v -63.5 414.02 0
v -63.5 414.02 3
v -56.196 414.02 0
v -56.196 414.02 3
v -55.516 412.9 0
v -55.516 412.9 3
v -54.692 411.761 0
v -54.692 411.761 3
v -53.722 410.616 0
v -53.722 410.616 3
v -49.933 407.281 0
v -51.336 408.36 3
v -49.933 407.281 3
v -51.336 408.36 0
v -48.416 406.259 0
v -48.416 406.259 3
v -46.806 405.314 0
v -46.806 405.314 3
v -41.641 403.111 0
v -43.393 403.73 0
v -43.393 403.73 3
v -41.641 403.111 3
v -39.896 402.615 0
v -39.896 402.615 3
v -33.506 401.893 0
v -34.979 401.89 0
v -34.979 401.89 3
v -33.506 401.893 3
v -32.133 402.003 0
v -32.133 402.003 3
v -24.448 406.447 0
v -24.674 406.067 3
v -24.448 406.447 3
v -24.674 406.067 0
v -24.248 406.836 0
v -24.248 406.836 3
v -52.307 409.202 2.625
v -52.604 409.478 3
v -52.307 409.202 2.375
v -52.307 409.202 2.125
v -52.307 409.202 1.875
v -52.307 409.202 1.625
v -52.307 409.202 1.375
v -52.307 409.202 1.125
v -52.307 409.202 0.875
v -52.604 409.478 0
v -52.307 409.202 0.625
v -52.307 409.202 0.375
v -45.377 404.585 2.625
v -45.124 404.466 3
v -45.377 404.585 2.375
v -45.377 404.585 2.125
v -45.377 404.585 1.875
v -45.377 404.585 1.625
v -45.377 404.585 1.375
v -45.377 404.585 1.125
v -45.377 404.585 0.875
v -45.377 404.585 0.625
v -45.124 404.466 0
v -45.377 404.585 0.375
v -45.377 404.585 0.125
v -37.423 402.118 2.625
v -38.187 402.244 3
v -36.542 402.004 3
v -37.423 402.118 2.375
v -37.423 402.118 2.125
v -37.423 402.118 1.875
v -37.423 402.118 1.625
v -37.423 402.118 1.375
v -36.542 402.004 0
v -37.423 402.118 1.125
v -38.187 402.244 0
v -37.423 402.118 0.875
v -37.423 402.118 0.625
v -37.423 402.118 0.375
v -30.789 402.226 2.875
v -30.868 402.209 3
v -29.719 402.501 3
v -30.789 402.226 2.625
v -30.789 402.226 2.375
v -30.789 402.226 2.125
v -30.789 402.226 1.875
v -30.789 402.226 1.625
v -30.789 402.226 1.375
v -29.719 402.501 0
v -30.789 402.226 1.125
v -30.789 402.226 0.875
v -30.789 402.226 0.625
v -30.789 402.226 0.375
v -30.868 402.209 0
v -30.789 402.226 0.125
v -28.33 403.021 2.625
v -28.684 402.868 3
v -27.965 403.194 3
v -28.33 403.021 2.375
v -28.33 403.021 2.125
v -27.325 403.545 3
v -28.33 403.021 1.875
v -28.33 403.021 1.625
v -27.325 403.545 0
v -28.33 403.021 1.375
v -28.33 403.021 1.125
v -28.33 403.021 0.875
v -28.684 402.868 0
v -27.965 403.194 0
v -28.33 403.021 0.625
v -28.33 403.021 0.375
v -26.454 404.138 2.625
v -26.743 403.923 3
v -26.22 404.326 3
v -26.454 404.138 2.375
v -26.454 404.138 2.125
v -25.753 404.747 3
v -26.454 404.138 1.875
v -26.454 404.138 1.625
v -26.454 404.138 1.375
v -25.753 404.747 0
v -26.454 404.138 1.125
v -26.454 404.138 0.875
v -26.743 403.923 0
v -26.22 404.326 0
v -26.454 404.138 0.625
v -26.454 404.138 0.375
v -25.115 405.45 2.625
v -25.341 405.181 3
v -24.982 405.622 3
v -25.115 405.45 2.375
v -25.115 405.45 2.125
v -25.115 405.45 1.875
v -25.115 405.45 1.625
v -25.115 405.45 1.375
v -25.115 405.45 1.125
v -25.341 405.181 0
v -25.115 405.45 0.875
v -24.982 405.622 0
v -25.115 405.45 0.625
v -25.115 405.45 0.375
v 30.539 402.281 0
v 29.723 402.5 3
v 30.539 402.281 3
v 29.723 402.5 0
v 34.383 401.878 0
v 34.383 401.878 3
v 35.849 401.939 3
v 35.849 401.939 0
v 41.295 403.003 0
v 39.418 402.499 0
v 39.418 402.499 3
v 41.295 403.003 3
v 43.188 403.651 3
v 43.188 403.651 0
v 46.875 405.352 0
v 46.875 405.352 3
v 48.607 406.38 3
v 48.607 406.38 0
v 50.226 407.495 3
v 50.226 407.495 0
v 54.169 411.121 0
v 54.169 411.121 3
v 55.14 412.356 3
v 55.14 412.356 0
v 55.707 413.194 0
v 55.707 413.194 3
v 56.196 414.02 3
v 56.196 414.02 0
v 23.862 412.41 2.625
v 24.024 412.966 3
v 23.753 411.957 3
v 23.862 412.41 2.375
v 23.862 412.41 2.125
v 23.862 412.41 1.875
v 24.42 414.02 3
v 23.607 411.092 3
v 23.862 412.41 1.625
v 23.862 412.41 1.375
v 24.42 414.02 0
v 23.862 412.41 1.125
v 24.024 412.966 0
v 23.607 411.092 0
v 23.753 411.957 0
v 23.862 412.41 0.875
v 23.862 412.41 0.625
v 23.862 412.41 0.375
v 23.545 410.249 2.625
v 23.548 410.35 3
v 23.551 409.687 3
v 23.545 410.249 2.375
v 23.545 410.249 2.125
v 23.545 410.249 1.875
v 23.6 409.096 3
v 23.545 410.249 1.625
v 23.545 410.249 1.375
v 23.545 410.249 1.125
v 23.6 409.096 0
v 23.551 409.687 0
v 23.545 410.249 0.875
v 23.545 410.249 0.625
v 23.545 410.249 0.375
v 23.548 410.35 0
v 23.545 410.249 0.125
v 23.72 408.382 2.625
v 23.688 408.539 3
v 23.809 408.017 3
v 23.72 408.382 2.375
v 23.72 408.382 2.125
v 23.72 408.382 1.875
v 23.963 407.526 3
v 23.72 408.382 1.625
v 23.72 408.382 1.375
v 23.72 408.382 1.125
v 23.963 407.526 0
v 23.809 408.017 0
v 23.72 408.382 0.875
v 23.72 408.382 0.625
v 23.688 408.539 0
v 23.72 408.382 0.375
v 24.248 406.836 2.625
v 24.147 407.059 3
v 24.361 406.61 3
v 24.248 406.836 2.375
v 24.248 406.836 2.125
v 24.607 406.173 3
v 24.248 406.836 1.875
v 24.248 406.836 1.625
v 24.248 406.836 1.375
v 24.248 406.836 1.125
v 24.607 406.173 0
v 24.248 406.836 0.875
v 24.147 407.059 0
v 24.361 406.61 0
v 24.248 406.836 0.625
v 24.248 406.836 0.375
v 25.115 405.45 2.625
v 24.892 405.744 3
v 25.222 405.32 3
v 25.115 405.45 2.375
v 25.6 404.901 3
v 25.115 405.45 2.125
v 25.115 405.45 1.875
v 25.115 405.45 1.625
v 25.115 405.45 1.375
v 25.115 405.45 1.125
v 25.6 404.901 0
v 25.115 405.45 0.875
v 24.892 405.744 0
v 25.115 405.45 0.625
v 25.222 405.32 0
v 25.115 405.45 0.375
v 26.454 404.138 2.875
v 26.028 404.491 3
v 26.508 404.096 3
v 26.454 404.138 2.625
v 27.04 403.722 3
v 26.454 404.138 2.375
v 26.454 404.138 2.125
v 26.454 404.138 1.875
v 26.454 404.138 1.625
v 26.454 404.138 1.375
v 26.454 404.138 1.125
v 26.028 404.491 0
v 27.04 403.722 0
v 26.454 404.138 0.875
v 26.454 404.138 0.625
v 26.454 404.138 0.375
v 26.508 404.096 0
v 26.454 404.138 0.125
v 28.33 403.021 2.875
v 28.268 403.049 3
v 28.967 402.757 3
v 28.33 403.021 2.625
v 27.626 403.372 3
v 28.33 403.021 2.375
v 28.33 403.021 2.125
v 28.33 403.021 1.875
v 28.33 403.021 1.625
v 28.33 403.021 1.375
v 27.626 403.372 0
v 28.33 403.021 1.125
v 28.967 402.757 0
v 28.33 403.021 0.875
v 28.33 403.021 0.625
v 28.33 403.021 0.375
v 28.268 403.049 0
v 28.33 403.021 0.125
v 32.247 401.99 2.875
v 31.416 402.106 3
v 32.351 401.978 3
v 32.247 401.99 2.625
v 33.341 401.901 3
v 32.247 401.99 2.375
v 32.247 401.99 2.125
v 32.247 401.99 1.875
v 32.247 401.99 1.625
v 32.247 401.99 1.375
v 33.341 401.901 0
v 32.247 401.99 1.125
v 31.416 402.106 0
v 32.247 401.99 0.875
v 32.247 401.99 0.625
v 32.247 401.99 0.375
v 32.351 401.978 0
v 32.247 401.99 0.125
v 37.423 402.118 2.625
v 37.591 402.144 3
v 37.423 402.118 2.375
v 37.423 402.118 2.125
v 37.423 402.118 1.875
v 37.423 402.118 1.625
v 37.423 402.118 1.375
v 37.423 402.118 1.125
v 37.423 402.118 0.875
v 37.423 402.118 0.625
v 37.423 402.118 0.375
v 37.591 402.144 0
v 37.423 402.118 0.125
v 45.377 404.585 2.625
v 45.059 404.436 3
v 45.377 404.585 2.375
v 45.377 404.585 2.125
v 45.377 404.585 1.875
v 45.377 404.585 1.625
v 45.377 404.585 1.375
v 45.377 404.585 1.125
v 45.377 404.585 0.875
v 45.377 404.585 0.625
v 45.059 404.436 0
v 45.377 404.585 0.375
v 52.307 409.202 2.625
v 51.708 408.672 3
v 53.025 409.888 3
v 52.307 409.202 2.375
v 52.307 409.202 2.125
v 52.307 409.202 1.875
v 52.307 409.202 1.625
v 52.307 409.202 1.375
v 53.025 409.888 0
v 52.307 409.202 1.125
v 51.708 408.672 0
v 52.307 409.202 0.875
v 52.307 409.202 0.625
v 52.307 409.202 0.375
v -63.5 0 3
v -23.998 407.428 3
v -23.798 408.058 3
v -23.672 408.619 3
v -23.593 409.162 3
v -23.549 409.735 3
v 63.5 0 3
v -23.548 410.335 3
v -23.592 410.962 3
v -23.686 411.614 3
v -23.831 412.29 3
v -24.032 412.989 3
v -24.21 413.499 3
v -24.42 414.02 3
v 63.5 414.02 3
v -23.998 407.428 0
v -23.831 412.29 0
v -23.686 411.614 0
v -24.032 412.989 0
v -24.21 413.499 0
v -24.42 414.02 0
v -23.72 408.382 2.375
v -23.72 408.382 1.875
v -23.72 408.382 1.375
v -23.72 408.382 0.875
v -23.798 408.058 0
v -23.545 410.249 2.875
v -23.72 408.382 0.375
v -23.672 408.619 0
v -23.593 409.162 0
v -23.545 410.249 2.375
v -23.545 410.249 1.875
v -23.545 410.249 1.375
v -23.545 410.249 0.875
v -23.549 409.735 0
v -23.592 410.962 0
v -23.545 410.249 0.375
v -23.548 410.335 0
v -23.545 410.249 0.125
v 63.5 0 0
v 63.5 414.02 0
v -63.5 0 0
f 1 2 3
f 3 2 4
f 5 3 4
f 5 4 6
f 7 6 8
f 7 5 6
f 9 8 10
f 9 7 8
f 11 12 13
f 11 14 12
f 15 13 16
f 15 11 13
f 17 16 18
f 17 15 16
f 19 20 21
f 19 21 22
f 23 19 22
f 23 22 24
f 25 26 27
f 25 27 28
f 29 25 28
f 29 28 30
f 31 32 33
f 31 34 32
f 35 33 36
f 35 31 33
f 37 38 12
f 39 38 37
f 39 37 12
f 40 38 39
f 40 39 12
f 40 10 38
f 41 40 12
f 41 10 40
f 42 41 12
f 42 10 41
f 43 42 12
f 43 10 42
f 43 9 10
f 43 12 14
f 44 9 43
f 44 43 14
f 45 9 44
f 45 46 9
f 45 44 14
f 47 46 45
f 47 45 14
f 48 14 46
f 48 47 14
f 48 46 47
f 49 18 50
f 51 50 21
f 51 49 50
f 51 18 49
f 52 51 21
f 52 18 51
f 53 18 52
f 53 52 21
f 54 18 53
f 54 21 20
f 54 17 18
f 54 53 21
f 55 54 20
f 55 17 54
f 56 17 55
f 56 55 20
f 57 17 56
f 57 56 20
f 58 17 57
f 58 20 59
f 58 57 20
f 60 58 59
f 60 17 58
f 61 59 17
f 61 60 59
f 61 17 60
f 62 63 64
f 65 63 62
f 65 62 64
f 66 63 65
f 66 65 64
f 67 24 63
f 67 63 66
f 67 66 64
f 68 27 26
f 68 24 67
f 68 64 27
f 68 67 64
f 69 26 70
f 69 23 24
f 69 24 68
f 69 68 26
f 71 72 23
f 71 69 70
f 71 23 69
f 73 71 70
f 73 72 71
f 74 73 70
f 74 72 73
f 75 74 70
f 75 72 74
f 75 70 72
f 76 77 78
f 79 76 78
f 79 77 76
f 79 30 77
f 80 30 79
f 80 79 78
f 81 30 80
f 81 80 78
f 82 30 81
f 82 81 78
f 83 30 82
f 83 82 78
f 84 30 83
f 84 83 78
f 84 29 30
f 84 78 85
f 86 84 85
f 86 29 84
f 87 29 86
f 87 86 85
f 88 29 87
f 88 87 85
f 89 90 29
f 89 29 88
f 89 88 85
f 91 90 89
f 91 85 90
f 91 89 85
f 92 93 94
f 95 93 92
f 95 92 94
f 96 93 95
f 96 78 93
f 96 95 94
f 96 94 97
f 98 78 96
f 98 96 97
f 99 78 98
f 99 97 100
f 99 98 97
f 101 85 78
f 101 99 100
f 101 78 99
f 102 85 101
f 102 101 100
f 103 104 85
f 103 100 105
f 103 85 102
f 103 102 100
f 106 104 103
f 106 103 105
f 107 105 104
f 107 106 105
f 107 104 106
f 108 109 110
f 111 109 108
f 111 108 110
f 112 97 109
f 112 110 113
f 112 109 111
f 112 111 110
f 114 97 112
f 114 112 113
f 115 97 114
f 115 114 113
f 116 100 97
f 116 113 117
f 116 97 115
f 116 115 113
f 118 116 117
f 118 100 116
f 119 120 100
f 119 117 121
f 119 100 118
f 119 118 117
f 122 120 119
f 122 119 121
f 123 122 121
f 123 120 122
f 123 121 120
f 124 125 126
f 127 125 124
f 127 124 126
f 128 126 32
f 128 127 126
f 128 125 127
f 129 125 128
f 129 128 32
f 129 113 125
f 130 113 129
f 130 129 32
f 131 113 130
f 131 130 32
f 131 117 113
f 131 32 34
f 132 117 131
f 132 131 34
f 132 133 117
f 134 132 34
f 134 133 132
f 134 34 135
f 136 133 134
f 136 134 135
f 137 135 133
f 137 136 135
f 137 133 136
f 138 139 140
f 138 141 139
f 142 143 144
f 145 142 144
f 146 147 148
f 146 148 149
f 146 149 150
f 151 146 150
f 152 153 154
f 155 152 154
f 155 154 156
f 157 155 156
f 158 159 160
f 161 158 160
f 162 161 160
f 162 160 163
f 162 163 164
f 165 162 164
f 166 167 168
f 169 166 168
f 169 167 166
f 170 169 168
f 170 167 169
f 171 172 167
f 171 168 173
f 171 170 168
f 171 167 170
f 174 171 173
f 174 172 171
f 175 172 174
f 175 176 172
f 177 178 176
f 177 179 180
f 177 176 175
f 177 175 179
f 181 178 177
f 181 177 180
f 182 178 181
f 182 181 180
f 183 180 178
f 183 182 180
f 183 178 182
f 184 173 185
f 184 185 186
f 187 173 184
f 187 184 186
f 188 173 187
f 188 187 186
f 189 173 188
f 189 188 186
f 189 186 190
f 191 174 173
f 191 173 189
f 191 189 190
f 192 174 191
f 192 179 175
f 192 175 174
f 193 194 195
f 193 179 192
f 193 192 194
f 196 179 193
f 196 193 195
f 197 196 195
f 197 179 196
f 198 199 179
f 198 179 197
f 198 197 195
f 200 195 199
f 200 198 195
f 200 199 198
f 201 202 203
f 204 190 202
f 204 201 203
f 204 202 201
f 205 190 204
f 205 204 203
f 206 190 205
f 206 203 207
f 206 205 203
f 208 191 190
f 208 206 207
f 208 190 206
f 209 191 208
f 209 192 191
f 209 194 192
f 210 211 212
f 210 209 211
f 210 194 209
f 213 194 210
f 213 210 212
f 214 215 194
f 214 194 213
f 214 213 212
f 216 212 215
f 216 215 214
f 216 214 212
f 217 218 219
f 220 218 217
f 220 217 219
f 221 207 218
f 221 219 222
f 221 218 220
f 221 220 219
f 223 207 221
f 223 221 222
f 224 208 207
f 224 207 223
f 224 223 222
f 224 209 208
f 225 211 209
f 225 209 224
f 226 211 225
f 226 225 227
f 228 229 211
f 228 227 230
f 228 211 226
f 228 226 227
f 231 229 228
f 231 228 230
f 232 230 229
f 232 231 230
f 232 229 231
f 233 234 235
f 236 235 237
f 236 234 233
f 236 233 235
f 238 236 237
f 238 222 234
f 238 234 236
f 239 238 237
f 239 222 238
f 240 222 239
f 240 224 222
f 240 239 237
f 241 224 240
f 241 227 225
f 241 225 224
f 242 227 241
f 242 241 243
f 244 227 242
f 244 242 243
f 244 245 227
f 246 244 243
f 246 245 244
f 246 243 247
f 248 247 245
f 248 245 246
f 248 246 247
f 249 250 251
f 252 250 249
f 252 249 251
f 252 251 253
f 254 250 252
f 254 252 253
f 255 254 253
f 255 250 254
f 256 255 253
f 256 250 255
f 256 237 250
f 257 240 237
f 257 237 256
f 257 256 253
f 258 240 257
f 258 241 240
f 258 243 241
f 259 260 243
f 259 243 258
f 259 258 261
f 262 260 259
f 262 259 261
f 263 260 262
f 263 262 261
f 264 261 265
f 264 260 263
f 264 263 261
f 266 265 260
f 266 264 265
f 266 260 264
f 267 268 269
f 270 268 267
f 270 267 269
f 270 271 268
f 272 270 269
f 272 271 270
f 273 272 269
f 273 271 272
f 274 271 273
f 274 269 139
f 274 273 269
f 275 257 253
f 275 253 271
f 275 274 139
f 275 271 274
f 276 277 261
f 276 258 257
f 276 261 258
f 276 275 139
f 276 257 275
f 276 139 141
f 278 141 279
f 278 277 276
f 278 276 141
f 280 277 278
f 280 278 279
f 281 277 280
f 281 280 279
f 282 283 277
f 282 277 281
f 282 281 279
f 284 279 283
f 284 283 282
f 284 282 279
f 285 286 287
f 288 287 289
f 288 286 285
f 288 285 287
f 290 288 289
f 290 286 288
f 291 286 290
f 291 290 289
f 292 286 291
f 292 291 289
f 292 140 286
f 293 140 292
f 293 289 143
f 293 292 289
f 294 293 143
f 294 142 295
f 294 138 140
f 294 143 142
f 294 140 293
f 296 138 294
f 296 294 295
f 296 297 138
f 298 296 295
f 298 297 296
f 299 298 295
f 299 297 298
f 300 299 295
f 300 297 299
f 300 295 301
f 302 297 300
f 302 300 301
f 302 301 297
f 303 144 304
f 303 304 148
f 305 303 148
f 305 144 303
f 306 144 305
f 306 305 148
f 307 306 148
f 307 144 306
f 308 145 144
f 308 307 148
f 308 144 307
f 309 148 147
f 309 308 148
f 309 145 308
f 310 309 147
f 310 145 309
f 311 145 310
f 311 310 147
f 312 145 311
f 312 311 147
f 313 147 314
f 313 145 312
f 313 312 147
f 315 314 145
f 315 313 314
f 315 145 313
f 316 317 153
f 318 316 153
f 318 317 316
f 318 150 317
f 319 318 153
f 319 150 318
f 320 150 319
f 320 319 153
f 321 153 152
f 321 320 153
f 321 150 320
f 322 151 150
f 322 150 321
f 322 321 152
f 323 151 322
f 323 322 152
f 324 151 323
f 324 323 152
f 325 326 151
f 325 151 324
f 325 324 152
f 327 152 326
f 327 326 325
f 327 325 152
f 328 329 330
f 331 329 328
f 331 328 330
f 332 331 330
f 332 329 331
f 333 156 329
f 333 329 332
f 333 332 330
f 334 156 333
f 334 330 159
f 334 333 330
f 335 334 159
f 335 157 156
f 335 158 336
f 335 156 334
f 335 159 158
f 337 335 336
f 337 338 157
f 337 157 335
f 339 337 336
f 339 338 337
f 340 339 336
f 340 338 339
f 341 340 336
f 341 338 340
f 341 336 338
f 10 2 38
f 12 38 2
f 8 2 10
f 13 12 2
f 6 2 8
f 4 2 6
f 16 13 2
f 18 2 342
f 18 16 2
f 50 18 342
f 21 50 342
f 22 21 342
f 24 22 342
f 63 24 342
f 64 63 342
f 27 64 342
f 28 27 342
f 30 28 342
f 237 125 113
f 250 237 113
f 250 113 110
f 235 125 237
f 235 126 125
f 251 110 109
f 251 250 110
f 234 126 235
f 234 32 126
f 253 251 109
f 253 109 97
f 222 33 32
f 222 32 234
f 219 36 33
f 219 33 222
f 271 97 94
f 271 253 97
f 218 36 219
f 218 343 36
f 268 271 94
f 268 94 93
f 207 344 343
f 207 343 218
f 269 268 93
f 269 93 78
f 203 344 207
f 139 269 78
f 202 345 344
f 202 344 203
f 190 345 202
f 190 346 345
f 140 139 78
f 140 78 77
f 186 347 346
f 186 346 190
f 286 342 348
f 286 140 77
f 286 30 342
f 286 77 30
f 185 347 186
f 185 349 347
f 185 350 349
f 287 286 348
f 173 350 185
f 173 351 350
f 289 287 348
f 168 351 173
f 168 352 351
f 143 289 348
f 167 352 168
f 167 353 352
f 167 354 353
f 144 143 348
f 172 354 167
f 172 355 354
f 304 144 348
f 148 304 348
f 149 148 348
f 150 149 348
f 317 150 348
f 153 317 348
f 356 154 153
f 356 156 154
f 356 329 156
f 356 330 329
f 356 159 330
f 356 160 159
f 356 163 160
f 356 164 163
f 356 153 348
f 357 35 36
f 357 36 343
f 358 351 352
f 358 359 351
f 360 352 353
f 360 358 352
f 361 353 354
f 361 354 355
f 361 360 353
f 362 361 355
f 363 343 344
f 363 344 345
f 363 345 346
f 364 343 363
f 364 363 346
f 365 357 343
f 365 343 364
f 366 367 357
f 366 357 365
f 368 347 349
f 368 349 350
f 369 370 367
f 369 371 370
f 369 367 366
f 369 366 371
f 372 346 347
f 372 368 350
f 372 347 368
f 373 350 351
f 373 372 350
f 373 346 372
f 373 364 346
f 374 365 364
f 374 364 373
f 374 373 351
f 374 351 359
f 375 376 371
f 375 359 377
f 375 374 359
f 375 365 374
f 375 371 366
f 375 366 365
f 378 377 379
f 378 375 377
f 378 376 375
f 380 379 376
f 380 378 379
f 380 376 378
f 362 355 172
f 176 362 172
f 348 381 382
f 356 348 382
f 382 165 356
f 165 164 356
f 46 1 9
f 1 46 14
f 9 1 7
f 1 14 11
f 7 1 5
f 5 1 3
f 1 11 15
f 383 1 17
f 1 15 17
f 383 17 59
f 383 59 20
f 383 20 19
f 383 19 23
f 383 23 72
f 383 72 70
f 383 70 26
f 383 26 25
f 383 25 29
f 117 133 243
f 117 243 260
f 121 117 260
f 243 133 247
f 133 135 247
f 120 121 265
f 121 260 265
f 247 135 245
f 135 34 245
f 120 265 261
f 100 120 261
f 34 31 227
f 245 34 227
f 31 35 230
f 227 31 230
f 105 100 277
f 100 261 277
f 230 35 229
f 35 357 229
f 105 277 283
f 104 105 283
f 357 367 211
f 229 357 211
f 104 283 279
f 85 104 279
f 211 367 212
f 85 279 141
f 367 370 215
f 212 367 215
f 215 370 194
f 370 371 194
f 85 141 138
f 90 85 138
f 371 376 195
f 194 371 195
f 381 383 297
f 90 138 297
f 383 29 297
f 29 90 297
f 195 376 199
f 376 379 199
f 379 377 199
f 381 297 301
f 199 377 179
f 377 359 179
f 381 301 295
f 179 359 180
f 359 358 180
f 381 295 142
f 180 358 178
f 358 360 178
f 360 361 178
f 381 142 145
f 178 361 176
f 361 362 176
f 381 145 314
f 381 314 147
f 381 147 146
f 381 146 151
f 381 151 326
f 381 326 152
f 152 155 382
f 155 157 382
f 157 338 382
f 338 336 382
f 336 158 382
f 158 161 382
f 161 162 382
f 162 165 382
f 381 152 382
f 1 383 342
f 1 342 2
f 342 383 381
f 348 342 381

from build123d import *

# Parameters (mm, degrees)
BOSS_EXTRUDE1_OUTLINE_W = 127
BOSS_EXTRUDE1_OUTLINE_H = 508
BOSS_EXTRUDE1_DEPTH     = 3
SKETCH2_W               = 127
SKETCH2_H               = 93.98
CLEARANCE_DEPTH         = 512.962156917


# Read off the part's stored shape, not the designer's step: Boss-Extrude1
with BuildPart() as part:
    # Boss-Extrude1 outline → Boss-Extrude1 (new body)
    with BuildSketch(Plane.XY):
        with Locations((0, 254)):
            Rectangle(BOSS_EXTRUDE1_OUTLINE_W, BOSS_EXTRUDE1_OUTLINE_H)
        with BuildLine():
            add(Edge.make_bspline(
                [(-24.248447896, 406.835785182), (-24.020490126, 407.314748566), (-23.664729979, 408.320343277), (-23.462175176, 410.200931921), (-23.759442829, 412.367496281), (-24.97473491, 415.592555217), (-28.359599913, 420.118436778), (-35.635403135, 425.052654423), (-44.053113042, 427.587605354), (-49.700172647, 427.360376803), (-52.969485775, 426.269720281), (-54.838384763, 425.134120988), (-56.170139269, 423.790963502), (-57.004245667, 422.425575267), (-57.537885889, 420.9171832), (-57.740440691, 419.036594556), (-57.443173039, 416.870030196), (-56.227880958, 413.644971261), (-52.843015955, 409.119089699), (-45.567212732, 404.184872054), (-37.149502826, 401.649921123), (-31.502443221, 401.877149674), (-28.233130092, 402.967806196), (-26.364231105, 404.10340549), (-25.032476598, 405.446562975), (-24.476405666, 406.356821798), (-24.248447896, 406.835785182)],
                knots=[0, 0, 0, 0, 0.03125, 0.0625, 0.09375, 0.125, 0.1875, 0.25, 0.3125, 0.375, 0.40625, 0.4375, 0.46875, 0.5, 0.53125, 0.5625, 0.59375, 0.625, 0.6875, 0.75, 0.8125, 0.875, 0.90625, 0.9375, 0.96875, 1, 1, 1, 1], degree=3))
        make_face(mode=Mode.SUBTRACT)
        with BuildLine():
            add(Edge.make_bspline(
                [(56.954167971, 422.401741295), (56.726210201, 422.880704679), (56.170139269, 423.790963502), (54.838384763, 425.134120988), (52.969485775, 426.269720281), (49.700172647, 427.360376803), (44.053113042, 427.587605354), (35.635403135, 425.052654423), (28.359599913, 420.118436778), (24.97473491, 415.592555217), (23.759442829, 412.367496281), (23.462175176, 410.200931921), (23.664729979, 408.320343277), (24.1983702, 406.81195121), (25.032476598, 405.446562975), (26.364231105, 404.10340549), (28.233130092, 402.967806196), (31.502443221, 401.877149674), (37.149502826, 401.649921123), (45.567212732, 404.184872054), (52.843015955, 409.119089699), (56.227880958, 413.644971261), (57.443173039, 416.870030196), (57.740440691, 419.036594556), (57.537885889, 420.9171832), (57.182125741, 421.922777912), (56.954167971, 422.401741295)],
                knots=[0, 0, 0, 0, 0.03125, 0.0625, 0.09375, 0.125, 0.1875, 0.25, 0.3125, 0.375, 0.40625, 0.4375, 0.46875, 0.5, 0.53125, 0.5625, 0.59375, 0.625, 0.6875, 0.75, 0.8125, 0.875, 0.90625, 0.9375, 0.96875, 1, 1, 1, 1], degree=3))
        make_face(mode=Mode.SUBTRACT)
    extrude(amount=BOSS_EXTRUDE1_DEPTH)

    # Sketch2 → Clearance (cut, through all)
    with BuildSketch(Plane.XY.offset(3)):
        with Locations((0, 461.01)):
            Rectangle(SKETCH2_W, SKETCH2_H)
    extrude(amount=-CLEARANCE_DEPTH, mode=Mode.SUBTRACT)


solid = part.part
